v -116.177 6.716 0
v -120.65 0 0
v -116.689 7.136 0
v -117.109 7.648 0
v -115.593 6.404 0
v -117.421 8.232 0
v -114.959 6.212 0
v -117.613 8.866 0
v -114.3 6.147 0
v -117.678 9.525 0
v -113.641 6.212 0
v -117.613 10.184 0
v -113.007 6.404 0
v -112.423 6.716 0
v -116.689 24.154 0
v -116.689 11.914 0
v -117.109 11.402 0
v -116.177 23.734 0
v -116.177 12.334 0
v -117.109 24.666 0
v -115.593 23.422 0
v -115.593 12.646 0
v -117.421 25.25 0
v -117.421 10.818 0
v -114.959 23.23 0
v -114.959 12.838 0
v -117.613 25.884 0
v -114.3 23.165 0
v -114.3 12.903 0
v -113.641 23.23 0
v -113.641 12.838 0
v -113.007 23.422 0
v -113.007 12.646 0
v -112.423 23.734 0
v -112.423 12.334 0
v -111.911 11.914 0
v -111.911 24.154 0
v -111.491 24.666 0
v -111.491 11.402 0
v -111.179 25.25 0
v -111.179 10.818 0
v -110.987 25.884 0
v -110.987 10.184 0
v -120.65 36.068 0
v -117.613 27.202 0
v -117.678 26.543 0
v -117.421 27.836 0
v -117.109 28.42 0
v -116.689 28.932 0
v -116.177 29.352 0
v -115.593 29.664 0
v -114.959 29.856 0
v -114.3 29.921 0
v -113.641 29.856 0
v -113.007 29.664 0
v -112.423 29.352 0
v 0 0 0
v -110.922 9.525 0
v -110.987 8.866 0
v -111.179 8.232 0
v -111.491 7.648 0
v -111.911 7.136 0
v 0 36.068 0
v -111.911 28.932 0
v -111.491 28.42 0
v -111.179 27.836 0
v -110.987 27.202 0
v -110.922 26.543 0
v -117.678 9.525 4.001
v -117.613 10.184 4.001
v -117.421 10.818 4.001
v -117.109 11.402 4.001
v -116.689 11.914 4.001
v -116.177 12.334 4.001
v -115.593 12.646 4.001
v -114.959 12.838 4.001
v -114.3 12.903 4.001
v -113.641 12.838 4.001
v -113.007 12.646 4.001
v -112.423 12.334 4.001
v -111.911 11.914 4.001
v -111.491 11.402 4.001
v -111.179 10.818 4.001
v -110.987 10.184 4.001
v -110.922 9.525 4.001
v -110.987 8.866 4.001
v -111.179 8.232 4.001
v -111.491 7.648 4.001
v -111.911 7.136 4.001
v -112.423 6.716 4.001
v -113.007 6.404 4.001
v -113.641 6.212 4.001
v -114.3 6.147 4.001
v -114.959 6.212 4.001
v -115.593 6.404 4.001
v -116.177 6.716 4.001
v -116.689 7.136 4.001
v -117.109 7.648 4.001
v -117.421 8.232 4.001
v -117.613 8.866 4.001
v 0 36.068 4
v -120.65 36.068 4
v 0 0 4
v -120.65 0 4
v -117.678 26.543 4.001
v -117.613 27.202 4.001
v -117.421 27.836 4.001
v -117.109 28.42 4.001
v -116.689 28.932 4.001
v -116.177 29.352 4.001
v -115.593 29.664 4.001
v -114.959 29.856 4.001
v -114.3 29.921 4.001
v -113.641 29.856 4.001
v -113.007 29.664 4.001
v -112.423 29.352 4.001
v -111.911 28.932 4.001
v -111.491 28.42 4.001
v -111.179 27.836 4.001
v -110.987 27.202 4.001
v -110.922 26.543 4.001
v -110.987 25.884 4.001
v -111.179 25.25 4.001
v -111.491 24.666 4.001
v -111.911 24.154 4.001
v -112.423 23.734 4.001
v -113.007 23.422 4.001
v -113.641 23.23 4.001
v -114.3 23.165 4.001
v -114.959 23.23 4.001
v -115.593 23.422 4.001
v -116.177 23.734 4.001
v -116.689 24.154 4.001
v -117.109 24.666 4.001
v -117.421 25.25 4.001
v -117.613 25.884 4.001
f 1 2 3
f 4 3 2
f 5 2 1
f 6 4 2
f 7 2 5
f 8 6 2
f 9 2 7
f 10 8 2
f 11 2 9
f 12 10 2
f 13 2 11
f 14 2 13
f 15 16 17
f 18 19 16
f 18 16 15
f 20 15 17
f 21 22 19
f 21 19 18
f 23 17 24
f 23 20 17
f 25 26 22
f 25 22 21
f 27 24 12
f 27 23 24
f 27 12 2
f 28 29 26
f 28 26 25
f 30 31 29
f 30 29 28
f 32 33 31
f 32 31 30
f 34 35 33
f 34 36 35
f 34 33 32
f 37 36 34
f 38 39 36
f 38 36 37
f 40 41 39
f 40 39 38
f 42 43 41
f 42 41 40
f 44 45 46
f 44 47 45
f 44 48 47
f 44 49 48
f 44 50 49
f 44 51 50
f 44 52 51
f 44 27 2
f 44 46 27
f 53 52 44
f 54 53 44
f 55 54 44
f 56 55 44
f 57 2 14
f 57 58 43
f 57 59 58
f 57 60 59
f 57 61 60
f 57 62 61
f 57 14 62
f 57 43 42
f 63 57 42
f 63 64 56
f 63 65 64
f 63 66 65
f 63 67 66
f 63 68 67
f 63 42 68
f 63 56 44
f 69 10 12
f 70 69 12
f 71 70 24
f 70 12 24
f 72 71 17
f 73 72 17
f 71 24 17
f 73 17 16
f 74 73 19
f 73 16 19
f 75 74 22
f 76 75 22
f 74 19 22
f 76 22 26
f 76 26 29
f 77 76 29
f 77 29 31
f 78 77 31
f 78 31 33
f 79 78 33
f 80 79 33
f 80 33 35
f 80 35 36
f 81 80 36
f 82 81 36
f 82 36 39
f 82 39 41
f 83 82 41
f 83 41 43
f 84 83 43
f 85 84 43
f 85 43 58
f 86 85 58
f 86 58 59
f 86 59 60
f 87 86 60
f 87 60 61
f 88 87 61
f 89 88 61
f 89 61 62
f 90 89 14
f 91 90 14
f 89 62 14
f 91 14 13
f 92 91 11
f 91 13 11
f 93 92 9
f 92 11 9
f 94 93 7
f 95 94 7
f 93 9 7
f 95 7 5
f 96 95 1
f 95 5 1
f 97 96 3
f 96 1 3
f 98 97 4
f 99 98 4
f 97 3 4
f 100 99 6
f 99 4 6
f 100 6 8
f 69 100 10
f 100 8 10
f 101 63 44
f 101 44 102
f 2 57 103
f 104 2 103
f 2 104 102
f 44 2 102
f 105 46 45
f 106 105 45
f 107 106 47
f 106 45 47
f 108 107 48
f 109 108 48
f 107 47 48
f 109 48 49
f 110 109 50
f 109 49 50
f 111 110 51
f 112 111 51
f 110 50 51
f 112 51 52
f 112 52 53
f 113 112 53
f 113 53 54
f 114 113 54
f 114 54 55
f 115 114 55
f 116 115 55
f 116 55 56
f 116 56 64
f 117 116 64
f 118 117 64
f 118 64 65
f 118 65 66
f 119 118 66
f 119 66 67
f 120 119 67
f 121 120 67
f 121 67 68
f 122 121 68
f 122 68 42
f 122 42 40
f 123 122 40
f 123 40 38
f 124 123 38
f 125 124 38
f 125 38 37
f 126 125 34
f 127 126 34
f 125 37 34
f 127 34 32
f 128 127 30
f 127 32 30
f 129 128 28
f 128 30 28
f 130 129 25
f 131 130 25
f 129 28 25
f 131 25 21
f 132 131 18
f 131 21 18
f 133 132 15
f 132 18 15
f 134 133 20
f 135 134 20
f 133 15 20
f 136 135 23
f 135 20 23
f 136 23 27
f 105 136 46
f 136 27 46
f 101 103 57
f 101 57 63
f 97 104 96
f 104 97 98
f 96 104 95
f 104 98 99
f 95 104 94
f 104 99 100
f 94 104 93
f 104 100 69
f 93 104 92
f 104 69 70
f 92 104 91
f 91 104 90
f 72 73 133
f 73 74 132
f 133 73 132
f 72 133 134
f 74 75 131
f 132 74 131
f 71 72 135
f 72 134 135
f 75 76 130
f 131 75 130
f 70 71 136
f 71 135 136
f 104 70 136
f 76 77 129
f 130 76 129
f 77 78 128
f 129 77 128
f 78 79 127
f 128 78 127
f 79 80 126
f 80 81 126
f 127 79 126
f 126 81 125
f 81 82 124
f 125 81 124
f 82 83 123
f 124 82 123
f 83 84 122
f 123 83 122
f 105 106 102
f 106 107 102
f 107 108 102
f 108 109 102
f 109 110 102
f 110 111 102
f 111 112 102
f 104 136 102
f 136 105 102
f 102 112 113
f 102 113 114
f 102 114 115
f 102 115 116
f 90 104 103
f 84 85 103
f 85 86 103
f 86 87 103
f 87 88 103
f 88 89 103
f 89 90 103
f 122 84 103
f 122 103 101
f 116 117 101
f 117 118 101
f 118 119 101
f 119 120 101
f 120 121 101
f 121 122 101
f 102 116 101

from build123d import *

# Parameters (mm, degrees)
F0_W     = 36.068
F0_H     = 4.0005
F1_DEPTH = 120.65
F4_D     = 6.7564


with BuildPart() as f1:
    # F0 (on Right) → F1 (new body)
    with BuildSketch(Plane.YZ):
        with Locations((18.034, 2.00025)):
            Rectangle(F0_W, F0_H)
    extrude(amount=-F1_DEPTH)

    # F4 (through all)
    with Locations(Plane.XY.offset(4.0005)):
        with Locations((-114.3, 26.543), (-114.3, 9.525)):
            Hole(F4_D / 2)


solid = f1.part
